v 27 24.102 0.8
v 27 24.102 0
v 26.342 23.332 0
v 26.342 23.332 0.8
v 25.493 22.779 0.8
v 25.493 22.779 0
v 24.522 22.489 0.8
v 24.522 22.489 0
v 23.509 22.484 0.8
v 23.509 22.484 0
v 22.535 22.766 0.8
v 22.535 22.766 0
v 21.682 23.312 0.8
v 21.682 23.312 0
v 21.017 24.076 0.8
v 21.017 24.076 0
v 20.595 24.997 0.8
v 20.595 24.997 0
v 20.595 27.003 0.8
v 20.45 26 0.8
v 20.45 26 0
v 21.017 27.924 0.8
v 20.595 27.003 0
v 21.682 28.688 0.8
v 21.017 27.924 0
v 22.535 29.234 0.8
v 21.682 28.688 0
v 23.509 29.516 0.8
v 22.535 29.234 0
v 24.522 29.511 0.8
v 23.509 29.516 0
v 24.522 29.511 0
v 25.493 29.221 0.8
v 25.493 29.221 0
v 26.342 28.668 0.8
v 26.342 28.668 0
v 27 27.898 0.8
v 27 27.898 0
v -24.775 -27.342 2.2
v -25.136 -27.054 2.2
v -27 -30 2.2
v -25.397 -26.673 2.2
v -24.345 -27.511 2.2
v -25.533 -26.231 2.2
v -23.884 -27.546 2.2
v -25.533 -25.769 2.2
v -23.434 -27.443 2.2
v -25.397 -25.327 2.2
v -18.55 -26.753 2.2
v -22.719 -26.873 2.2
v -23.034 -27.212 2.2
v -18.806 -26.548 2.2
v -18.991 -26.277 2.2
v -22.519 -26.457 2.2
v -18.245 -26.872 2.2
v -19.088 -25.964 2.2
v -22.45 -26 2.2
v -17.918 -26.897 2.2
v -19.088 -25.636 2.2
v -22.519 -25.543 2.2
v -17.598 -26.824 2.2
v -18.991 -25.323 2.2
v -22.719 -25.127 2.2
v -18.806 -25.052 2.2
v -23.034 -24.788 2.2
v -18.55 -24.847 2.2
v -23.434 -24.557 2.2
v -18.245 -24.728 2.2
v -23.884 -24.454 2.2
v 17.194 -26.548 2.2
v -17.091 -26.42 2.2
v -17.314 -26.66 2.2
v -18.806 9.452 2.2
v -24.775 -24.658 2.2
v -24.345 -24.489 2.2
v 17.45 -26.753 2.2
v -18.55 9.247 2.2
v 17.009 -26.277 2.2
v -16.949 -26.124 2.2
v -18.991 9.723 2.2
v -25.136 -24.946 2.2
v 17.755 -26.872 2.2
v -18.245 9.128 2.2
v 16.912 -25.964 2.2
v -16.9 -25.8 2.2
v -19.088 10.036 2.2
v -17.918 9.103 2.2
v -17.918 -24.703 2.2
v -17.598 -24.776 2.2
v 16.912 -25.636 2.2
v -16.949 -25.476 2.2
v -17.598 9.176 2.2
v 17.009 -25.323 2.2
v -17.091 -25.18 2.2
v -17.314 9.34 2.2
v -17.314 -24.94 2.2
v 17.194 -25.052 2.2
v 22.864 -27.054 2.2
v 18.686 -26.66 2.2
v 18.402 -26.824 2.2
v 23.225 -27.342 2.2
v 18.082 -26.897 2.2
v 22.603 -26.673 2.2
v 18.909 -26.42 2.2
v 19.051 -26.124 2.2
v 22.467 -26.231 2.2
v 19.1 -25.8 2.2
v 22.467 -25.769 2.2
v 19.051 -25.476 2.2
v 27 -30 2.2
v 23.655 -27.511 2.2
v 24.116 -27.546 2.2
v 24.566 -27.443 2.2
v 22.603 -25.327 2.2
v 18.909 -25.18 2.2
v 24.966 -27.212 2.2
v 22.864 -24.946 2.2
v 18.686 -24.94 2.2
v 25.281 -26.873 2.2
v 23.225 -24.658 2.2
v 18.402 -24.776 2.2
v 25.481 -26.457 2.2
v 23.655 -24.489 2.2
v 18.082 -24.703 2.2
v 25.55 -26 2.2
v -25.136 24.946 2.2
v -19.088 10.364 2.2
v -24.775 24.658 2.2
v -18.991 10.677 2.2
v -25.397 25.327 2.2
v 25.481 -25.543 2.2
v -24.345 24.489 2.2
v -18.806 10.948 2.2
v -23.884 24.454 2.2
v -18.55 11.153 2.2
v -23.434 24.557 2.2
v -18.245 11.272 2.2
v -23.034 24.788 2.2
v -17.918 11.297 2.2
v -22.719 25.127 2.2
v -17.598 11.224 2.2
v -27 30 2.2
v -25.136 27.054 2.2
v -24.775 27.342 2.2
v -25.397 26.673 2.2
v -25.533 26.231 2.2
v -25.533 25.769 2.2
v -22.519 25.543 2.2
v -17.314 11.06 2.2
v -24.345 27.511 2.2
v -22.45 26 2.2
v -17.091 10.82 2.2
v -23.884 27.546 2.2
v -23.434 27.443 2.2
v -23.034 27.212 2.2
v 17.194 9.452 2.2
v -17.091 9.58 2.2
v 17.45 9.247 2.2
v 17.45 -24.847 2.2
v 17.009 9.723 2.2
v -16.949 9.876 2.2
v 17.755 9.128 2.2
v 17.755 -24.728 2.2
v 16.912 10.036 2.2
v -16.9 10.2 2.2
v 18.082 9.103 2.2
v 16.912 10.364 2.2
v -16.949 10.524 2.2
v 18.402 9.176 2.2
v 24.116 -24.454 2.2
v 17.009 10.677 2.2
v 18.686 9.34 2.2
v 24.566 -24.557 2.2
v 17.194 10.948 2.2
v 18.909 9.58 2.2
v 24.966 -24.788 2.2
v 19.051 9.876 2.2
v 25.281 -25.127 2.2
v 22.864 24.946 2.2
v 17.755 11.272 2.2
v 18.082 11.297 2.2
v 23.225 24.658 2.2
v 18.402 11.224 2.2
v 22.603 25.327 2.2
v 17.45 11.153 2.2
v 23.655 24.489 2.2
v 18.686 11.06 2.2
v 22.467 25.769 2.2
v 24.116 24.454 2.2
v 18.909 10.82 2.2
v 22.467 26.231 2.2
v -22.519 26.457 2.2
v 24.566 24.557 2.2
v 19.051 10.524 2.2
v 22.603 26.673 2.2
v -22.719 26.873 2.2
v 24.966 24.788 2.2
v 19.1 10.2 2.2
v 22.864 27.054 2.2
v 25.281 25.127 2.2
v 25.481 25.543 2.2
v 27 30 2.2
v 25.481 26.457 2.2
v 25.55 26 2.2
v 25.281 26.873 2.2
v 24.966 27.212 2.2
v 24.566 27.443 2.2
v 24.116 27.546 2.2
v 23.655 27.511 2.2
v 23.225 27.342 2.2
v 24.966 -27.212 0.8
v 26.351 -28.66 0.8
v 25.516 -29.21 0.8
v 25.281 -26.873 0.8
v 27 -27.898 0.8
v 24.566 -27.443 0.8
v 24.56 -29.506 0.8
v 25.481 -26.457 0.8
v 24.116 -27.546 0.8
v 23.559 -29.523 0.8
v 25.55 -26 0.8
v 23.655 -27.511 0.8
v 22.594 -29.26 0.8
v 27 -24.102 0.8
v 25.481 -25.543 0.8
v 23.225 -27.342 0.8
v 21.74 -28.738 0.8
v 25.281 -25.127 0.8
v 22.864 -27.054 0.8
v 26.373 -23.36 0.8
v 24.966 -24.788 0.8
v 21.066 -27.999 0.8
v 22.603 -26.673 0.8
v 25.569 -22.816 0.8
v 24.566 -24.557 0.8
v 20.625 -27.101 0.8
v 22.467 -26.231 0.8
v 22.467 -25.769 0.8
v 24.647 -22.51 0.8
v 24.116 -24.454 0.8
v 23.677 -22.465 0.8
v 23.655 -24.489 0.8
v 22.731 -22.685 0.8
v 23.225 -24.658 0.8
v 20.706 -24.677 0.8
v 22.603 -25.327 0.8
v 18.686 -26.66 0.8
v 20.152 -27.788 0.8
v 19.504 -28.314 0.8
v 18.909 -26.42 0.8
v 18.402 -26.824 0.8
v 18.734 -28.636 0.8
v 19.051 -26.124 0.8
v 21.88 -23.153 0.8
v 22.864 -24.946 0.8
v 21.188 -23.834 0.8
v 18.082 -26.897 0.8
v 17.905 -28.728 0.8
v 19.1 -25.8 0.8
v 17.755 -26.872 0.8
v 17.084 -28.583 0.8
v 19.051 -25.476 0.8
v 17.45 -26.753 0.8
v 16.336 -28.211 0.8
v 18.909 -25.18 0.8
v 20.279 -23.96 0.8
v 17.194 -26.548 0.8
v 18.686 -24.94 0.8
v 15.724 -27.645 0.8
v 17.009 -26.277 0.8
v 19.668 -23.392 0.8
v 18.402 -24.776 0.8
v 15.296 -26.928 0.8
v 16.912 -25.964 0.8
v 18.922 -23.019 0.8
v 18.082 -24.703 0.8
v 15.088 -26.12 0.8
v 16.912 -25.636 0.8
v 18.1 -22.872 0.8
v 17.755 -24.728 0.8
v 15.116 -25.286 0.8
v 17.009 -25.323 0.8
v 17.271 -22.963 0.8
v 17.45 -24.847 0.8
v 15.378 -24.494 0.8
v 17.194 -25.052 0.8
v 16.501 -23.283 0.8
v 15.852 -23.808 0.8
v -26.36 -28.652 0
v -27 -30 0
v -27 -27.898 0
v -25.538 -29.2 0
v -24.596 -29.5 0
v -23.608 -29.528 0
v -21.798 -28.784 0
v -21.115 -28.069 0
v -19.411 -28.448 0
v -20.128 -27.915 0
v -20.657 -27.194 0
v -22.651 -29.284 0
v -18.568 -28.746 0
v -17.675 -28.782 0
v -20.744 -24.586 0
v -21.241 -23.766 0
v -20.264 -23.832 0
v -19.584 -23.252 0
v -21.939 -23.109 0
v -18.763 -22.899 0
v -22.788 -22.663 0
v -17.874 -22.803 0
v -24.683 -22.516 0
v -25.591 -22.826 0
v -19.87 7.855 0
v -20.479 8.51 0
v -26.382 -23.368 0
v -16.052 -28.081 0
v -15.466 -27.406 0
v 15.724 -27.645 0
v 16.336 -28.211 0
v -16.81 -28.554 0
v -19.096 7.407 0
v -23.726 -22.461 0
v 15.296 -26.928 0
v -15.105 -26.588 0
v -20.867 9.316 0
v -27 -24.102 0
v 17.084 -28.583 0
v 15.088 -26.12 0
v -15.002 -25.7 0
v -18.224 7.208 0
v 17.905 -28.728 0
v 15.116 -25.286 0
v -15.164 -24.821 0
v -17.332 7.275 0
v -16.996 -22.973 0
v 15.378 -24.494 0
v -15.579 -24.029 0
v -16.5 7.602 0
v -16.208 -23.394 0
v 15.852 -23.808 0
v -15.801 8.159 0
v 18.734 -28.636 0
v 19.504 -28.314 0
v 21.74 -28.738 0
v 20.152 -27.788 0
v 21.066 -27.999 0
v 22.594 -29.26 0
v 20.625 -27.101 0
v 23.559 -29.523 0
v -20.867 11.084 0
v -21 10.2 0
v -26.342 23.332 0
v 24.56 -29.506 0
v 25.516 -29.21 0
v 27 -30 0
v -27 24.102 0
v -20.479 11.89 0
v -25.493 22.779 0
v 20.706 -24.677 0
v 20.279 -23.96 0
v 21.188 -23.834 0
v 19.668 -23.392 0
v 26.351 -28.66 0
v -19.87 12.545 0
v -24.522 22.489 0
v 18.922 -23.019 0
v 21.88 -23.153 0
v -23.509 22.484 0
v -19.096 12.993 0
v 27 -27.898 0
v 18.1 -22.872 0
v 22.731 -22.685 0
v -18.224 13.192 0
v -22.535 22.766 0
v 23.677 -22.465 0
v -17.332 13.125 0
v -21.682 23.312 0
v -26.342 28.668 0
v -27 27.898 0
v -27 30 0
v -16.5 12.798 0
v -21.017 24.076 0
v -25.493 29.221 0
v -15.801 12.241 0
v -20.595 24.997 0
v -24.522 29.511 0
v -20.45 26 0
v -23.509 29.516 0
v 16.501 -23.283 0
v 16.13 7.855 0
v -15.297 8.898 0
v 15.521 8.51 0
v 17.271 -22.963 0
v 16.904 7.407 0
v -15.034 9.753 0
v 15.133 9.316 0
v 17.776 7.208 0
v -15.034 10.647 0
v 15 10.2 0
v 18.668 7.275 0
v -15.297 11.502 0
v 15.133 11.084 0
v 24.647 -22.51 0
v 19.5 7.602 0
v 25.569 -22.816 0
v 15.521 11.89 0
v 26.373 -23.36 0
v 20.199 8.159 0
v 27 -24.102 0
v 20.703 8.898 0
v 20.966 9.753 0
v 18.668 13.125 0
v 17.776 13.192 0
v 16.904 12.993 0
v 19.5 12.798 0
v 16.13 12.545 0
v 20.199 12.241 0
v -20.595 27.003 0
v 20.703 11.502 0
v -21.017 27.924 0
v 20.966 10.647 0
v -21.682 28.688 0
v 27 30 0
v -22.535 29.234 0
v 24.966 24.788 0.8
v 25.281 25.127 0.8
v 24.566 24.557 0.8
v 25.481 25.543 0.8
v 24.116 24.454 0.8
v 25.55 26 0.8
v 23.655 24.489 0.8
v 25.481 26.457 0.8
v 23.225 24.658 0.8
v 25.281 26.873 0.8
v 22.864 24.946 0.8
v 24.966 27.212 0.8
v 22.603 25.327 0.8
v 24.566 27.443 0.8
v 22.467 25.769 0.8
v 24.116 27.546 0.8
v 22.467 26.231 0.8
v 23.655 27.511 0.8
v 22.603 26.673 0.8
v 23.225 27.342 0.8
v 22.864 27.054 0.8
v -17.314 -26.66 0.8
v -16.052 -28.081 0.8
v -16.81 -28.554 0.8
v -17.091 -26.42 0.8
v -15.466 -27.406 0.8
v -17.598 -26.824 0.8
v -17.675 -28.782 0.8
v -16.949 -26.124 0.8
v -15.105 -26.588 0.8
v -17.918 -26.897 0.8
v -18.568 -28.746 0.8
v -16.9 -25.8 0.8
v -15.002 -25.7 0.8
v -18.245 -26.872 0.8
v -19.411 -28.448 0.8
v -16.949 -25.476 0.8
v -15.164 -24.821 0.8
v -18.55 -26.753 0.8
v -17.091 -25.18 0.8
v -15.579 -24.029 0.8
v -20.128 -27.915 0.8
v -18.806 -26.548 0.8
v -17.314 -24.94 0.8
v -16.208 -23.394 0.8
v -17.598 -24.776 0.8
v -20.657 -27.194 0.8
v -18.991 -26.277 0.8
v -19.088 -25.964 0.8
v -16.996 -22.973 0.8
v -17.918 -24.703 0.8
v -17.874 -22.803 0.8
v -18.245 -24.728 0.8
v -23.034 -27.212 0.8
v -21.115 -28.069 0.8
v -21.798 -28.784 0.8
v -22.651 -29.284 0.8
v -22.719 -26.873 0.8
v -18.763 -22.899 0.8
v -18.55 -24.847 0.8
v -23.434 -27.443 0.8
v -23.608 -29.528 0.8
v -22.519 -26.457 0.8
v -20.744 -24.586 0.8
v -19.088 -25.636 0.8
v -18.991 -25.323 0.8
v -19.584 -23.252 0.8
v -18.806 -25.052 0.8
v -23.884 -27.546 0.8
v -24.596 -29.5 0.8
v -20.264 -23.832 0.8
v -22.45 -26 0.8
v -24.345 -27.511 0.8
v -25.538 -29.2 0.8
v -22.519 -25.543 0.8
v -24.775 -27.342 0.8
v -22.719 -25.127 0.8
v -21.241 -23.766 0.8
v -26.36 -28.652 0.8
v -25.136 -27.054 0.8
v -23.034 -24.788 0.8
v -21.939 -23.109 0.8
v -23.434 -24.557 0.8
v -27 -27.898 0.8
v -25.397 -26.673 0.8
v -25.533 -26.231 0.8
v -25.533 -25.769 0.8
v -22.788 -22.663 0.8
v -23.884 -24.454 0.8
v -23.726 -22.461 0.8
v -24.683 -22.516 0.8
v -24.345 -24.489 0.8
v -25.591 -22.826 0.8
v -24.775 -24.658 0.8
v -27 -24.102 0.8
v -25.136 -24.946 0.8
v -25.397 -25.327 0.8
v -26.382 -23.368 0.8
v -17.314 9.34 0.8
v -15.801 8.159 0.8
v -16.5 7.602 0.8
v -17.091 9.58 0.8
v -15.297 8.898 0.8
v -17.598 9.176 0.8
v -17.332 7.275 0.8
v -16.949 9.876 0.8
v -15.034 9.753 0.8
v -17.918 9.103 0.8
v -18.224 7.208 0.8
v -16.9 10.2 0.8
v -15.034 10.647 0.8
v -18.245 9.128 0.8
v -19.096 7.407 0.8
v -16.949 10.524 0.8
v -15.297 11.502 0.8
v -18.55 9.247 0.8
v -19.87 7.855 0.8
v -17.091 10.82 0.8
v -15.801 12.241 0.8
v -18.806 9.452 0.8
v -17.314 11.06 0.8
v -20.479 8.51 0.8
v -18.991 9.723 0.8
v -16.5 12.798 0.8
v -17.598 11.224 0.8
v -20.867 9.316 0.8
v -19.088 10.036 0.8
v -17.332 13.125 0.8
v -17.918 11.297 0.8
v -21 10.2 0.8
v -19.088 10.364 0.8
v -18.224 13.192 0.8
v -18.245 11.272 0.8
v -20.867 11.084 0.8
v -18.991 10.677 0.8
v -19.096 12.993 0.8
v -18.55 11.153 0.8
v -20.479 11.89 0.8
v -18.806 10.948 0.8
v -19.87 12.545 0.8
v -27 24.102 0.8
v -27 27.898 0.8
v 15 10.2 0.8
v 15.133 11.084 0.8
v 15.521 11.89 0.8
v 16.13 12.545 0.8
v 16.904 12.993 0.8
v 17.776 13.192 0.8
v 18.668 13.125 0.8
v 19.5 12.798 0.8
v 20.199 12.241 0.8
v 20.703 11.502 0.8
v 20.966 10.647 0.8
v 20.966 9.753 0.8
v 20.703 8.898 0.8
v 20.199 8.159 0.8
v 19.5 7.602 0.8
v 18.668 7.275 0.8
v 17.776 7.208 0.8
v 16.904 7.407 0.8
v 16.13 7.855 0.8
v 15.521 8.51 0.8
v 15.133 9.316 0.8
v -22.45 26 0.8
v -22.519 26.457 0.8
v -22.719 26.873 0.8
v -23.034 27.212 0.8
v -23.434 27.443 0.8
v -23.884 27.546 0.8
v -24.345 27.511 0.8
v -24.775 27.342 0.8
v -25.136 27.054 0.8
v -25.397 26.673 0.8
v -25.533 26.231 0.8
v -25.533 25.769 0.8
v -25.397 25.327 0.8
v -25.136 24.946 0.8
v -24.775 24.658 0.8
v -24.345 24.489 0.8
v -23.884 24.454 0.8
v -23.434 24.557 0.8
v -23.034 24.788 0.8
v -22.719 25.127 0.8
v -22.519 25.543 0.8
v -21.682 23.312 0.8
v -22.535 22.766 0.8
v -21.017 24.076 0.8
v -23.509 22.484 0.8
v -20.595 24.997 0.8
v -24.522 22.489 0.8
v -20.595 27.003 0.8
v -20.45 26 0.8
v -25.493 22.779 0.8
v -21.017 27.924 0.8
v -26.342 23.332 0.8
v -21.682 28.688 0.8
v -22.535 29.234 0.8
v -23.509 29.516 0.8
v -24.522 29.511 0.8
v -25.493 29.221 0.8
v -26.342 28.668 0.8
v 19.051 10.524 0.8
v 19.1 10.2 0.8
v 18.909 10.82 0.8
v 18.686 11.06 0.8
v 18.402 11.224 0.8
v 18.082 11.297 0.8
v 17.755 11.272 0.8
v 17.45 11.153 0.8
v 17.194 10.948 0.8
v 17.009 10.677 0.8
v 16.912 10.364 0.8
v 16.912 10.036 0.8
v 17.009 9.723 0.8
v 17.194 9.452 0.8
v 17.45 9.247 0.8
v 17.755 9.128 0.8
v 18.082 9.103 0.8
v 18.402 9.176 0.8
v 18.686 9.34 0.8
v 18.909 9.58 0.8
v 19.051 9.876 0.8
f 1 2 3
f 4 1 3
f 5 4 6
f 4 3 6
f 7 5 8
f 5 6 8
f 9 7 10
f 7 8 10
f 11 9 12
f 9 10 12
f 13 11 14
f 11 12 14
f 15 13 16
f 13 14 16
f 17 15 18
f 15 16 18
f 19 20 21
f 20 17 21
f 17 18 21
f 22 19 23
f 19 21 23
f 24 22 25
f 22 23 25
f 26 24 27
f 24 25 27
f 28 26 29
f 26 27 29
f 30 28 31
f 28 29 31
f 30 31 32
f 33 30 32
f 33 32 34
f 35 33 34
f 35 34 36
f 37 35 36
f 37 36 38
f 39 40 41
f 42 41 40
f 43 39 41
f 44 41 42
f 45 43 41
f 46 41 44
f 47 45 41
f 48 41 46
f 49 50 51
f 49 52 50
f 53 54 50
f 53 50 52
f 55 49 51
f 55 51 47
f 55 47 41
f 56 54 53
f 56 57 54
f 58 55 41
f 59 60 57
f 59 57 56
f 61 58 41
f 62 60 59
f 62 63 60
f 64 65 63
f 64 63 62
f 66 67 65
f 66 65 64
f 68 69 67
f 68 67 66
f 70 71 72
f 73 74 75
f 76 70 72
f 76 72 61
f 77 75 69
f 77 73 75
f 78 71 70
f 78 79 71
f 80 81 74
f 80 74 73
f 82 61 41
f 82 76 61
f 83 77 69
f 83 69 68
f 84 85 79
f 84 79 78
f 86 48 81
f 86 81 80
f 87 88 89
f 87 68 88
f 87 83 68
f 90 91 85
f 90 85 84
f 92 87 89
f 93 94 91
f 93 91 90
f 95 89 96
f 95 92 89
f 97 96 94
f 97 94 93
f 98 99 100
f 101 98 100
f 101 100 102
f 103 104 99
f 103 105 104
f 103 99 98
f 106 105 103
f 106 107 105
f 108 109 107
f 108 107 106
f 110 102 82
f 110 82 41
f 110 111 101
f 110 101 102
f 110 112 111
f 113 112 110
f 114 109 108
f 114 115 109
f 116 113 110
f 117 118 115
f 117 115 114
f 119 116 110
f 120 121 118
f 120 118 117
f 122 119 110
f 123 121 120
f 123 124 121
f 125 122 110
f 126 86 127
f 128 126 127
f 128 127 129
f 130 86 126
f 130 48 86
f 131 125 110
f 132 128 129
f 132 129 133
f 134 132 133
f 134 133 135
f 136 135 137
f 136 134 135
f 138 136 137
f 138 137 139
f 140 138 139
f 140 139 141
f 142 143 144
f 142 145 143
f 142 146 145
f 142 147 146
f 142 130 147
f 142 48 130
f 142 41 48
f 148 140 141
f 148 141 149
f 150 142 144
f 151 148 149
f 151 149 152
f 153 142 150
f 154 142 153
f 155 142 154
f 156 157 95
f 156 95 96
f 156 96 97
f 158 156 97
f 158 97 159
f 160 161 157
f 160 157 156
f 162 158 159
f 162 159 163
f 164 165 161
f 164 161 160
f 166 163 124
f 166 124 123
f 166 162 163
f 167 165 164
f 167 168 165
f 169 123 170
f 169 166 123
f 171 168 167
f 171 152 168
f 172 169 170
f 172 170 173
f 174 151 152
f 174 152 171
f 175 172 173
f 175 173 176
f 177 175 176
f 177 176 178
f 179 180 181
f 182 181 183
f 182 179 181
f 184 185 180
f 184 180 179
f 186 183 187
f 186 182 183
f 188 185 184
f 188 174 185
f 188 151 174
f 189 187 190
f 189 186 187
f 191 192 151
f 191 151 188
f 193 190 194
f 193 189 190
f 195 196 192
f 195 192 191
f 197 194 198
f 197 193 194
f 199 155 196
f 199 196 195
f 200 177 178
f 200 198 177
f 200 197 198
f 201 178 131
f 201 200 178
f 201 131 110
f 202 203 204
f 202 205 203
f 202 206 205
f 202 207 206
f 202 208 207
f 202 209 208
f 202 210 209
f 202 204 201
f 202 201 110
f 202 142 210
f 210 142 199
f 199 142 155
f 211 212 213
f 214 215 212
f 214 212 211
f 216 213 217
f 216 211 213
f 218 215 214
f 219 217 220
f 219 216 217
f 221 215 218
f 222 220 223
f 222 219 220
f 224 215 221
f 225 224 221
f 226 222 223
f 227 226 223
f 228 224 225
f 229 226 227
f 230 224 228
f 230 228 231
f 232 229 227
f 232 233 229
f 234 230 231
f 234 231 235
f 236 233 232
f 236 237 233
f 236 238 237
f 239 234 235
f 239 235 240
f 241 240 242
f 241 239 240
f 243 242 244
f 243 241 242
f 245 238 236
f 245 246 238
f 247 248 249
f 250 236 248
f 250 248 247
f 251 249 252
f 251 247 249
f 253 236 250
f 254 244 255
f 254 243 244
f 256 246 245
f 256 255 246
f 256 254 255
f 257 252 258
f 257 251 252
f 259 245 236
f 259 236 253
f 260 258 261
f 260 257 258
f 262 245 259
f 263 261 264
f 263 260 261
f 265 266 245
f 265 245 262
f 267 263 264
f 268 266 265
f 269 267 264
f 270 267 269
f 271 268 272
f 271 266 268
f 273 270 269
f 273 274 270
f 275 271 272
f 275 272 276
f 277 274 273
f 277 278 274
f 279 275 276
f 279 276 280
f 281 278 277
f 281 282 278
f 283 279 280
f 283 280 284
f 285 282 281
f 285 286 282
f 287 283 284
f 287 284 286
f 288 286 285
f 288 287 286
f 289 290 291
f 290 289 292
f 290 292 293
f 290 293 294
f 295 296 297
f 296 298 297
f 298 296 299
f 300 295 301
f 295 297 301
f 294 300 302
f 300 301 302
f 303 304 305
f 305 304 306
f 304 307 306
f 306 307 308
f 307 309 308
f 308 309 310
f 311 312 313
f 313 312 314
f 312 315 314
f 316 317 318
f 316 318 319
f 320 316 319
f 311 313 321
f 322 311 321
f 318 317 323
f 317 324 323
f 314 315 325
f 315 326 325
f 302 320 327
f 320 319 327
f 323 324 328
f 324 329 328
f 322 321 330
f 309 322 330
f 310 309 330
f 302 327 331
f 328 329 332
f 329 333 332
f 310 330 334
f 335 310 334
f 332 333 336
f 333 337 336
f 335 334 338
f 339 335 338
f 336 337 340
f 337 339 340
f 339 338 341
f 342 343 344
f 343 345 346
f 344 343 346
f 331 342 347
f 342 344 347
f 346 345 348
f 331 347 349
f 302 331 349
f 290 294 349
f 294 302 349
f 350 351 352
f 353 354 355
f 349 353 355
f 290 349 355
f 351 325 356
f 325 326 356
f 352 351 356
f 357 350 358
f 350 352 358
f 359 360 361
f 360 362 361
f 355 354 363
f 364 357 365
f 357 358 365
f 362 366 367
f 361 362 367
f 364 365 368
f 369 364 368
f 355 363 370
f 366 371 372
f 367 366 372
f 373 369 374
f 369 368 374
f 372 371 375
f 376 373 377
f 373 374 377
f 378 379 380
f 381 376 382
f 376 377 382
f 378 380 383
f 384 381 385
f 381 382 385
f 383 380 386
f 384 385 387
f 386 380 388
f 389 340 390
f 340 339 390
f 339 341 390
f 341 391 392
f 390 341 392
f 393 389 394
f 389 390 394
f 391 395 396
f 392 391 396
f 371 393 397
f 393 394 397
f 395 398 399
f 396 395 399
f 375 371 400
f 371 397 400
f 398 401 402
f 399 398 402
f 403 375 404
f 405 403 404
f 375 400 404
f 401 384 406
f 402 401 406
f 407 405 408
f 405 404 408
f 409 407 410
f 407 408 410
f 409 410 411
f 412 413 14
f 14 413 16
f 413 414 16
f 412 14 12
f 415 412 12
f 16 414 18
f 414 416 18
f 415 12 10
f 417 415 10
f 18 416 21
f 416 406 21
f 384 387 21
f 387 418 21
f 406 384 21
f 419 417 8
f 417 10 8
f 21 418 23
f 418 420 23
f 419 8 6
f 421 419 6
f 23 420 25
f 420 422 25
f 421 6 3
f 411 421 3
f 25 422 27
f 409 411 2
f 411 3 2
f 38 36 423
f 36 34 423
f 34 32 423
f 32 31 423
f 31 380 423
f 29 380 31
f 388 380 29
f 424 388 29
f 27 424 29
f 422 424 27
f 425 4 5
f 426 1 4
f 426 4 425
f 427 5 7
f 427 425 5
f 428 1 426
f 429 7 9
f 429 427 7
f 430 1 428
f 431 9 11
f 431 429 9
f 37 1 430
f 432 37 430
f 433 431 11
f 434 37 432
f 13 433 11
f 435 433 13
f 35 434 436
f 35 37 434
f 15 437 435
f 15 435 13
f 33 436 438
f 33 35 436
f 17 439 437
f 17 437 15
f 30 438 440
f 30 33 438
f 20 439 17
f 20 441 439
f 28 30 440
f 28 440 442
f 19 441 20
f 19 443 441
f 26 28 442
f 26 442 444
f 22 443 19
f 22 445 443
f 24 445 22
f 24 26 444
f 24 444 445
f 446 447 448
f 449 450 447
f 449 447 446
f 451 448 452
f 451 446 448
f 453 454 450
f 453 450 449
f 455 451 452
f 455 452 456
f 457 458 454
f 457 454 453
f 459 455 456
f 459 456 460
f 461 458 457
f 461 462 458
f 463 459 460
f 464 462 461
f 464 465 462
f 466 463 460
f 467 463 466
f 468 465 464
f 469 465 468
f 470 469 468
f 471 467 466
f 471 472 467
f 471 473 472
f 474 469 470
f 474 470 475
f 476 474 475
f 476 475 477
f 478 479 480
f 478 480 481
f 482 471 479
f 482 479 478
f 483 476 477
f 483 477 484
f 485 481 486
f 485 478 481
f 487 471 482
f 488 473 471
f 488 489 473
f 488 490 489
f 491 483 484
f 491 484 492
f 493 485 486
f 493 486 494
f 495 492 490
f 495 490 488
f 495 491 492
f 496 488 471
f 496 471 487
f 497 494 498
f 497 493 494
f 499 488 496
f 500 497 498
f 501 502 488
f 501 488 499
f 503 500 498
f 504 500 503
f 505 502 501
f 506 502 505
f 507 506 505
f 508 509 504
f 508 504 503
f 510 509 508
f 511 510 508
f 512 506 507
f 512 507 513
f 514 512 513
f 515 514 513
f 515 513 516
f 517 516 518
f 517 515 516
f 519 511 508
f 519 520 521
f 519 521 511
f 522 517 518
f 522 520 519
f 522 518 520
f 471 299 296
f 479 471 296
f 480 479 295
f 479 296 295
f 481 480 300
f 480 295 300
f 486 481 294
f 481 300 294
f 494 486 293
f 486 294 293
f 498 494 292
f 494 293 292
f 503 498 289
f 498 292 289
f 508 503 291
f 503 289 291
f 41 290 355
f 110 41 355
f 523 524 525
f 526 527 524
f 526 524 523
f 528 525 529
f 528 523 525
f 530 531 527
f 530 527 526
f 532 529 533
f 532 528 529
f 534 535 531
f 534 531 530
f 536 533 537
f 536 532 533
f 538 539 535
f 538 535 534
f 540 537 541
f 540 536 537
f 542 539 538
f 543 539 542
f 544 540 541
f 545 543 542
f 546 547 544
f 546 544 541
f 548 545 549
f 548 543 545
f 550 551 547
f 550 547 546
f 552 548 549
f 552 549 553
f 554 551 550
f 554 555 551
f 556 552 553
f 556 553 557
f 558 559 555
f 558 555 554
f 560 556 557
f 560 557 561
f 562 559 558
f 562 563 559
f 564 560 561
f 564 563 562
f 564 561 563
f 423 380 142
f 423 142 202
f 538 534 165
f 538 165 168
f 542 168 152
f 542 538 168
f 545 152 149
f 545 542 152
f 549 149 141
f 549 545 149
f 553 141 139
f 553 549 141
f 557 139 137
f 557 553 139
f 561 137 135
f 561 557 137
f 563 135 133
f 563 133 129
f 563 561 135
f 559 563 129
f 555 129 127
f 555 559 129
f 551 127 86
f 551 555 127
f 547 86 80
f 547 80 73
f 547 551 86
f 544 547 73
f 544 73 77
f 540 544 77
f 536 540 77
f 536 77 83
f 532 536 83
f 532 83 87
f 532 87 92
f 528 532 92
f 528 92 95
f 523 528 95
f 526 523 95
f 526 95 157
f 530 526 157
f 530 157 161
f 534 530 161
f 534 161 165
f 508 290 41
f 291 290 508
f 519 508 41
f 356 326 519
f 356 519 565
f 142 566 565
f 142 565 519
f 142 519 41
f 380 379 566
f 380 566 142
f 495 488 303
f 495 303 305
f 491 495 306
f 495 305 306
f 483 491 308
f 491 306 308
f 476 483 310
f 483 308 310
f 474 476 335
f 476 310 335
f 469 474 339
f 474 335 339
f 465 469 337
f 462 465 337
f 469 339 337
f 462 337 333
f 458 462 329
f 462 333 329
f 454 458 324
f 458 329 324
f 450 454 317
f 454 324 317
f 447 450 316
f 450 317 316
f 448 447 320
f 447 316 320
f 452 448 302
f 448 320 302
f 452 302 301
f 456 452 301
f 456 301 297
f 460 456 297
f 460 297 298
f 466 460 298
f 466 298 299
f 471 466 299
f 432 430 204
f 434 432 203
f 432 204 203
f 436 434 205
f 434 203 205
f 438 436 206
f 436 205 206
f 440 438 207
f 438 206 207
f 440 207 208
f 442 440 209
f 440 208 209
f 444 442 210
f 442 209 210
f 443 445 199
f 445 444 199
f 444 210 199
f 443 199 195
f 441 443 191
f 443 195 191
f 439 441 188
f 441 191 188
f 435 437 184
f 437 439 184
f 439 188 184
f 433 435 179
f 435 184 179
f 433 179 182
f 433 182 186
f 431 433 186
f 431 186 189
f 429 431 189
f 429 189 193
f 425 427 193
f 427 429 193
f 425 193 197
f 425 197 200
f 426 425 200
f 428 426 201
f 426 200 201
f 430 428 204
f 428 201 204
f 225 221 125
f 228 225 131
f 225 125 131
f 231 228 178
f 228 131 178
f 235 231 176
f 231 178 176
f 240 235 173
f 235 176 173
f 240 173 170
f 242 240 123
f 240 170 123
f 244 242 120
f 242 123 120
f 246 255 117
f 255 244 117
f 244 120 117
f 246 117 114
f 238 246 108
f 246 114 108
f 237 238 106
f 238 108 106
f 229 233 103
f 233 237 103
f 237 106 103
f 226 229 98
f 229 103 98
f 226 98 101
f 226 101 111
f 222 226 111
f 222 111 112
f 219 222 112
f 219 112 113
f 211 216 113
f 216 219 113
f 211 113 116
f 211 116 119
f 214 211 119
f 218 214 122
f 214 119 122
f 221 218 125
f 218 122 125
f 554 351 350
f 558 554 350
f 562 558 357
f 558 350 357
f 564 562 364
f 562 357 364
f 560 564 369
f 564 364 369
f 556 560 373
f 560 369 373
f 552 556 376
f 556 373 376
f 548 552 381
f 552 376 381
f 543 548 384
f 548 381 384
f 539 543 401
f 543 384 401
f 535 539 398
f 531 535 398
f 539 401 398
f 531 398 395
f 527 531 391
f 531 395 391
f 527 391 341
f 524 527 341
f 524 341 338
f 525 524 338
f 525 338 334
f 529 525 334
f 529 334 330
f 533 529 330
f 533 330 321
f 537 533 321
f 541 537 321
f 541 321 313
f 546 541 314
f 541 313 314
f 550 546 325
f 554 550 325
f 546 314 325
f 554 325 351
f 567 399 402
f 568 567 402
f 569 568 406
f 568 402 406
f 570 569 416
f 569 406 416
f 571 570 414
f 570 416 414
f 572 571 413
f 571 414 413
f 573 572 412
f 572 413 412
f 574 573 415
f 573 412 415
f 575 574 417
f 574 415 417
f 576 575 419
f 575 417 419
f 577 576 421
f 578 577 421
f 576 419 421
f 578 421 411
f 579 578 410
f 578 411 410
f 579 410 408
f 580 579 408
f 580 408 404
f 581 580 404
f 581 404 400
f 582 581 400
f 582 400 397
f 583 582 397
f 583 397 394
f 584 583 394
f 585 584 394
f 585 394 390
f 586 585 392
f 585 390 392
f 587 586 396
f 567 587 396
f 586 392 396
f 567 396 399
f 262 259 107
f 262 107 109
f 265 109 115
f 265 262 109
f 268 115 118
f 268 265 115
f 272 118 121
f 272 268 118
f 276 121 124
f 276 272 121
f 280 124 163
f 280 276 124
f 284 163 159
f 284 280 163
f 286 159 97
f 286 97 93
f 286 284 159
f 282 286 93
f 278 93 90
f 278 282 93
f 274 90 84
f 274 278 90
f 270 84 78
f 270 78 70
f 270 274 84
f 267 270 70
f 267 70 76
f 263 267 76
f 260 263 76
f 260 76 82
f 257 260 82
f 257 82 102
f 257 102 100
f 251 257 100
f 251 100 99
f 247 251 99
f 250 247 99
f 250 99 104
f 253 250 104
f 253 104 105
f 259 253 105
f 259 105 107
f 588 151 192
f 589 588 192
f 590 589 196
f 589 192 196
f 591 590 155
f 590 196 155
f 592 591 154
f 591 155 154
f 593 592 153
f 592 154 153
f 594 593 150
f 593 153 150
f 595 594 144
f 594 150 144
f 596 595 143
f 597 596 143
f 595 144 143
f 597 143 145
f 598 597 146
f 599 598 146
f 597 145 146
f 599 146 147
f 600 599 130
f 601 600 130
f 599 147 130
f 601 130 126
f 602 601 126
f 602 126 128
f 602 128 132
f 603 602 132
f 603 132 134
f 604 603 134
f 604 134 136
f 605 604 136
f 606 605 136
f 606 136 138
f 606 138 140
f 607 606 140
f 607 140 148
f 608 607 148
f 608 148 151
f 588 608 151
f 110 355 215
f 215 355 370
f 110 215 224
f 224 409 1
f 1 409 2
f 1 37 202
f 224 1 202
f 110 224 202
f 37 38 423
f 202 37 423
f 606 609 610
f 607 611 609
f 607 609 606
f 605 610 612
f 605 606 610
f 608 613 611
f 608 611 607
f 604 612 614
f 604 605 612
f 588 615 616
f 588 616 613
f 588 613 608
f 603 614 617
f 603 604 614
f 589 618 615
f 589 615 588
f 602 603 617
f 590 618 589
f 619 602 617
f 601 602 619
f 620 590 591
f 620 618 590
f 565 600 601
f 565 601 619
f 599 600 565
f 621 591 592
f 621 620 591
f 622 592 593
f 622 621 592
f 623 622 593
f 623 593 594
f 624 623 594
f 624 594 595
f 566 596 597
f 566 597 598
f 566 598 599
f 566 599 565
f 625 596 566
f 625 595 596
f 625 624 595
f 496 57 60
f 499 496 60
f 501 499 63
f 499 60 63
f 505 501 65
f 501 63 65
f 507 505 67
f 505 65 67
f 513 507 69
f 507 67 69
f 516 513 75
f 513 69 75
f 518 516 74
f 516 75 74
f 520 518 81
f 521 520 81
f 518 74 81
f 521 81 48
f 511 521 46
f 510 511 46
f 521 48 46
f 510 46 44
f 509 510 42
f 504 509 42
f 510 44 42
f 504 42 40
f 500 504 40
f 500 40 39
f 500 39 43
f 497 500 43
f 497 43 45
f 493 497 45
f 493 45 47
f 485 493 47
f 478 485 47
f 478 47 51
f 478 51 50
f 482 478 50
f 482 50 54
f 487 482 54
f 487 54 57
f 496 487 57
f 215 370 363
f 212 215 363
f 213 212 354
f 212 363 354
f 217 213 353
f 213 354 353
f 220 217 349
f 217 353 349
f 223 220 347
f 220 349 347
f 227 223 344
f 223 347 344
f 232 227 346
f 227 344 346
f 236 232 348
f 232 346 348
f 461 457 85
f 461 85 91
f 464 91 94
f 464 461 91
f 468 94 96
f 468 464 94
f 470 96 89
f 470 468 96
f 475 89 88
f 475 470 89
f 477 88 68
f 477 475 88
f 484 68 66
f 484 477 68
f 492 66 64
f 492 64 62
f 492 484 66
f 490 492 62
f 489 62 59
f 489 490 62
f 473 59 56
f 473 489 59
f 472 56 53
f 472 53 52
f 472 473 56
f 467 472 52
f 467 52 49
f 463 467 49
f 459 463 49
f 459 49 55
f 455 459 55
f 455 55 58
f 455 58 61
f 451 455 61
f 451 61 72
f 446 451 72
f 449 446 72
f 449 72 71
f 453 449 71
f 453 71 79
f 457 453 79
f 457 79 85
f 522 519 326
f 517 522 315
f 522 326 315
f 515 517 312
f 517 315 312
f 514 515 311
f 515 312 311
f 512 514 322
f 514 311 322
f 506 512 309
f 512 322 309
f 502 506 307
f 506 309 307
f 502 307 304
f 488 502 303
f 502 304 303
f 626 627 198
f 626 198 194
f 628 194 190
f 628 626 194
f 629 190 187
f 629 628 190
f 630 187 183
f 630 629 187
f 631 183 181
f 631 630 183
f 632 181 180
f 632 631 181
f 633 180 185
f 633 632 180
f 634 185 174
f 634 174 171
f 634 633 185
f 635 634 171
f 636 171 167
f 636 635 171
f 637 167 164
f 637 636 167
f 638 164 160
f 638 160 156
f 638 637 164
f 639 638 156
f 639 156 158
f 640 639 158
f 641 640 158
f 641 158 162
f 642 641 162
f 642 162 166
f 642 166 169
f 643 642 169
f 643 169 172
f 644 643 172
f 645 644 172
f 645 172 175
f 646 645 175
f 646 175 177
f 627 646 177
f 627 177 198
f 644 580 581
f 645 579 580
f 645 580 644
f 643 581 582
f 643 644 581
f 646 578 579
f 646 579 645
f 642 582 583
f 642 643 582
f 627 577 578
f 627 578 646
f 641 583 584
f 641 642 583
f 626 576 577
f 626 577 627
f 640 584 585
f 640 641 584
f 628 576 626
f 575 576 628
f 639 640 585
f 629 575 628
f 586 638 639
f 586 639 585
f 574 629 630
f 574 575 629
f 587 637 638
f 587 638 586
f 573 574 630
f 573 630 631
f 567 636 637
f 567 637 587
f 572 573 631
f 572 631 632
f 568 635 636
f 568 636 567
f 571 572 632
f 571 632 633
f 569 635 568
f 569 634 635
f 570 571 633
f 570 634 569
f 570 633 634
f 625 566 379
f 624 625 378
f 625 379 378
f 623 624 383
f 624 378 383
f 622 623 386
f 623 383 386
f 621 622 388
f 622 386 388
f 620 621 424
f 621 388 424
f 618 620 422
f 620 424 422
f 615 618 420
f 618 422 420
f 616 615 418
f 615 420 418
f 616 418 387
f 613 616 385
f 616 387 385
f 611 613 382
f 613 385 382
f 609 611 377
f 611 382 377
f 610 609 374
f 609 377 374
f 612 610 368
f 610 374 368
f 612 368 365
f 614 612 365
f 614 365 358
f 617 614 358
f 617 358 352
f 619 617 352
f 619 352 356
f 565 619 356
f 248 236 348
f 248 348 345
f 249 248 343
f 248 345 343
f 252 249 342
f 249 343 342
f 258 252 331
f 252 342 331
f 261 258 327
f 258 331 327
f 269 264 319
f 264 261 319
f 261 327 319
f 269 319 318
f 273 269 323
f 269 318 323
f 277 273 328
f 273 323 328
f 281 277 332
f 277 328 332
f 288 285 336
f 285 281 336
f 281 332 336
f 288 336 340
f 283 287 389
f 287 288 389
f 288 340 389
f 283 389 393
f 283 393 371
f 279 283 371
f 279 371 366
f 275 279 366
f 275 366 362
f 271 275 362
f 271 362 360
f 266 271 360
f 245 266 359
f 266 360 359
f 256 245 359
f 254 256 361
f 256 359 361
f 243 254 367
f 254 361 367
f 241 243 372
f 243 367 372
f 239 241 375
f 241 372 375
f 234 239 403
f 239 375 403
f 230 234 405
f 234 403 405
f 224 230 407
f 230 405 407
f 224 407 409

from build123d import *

# Parameters (mm, degrees)
SKETCH_1_W          = 54
SKETCH_1_H          = 60
SKETCH_1_R          = 1.1
EXTRUDE_1_DEPTH     = 2.2
SKETCH_2_R          = 3
SKETCH_2_R_2        = 2.929560398
CUT_EXTRUDE_1_DEPTH = 0.8
SKETCH_3_R          = 1.1
SKETCH_3_R_2        = 1.55
CUT_EXTRUDE_2_DEPTH = 3.2
SKETCH_4_R          = 3.55
SKETCH_4_R_2        = 1.55
CUT_EXTRUDE_3_DEPTH = 0.8


with BuildPart() as part:
    # 草图1 → 凸台-拉伸1 (new body)
    with BuildSketch(Plane.XY):
        Rectangle(SKETCH_1_W, SKETCH_1_H)
        with Locations((-18, -25.8)):
            Circle(SKETCH_1_R, mode=Mode.SUBTRACT)
        with Locations((18, -25.8)):
            Circle(SKETCH_1_R, mode=Mode.SUBTRACT)
        with Locations((-18, 10.2)):
            Circle(SKETCH_1_R, mode=Mode.SUBTRACT)
        with Locations((18, 10.2)):
            Circle(SKETCH_1_R, mode=Mode.SUBTRACT)
    extrude(amount=EXTRUDE_1_DEPTH)

    # 草图2 → 切除-拉伸1 (cut)
    with BuildSketch(Plane(origin=(0, 0, 0), x_dir=(-1, 0, 0), z_dir=(0, 0, -1))):
        with Locations((-18, 10.2)):
            Circle(SKETCH_2_R)
        with Locations((18, 10.2)):
            Circle(SKETCH_2_R)
        with Locations((-18, -25.8)):
            Circle(SKETCH_2_R_2)
        with Locations((18, -25.8)):
            Circle(SKETCH_2_R)
    extrude(amount=-CUT_EXTRUDE_1_DEPTH, mode=Mode.SUBTRACT)

    # 草图3 → 切除-拉伸2 (cut, through all)
    with BuildSketch(Plane.XY.offset(2.2)):
        with Locations((-18, -25.8)):
            Circle(SKETCH_3_R)
        with Locations((-24, -26)):
            Circle(SKETCH_3_R_2)
        with Locations((-24, 26)):
            Circle(SKETCH_3_R_2)
        with Locations((24, -26)):
            Circle(SKETCH_3_R_2)
        with Locations((24, 26)):
            Circle(SKETCH_3_R_2)
    extrude(amount=-CUT_EXTRUDE_2_DEPTH, mode=Mode.SUBTRACT)

    # 草图4 → 切除-拉伸3 (cut)
    with BuildSketch(Plane(origin=(0, 0, 0), x_dir=(-1, 0, 0), z_dir=(0, 0, -1))):
        with Locations((-24, 26)):
            Circle(SKETCH_4_R)
        with Locations((-24, 26)):
            Circle(SKETCH_4_R_2, mode=Mode.SUBTRACT)
        with Locations((24, 26)):
            Circle(SKETCH_4_R)
        with Locations((24, 26)):
            Circle(SKETCH_4_R_2, mode=Mode.SUBTRACT)
        with Locations((24, -26)):
            Circle(SKETCH_4_R)
        with Locations((24, -26)):
            Circle(SKETCH_4_R_2, mode=Mode.SUBTRACT)
        with Locations((-24, -26)):
            Circle(SKETCH_4_R)
        with Locations((-24, -26)):
            Circle(SKETCH_4_R_2, mode=Mode.SUBTRACT)
    extrude(amount=-CUT_EXTRUDE_3_DEPTH, mode=Mode.SUBTRACT)


solid = part.part
